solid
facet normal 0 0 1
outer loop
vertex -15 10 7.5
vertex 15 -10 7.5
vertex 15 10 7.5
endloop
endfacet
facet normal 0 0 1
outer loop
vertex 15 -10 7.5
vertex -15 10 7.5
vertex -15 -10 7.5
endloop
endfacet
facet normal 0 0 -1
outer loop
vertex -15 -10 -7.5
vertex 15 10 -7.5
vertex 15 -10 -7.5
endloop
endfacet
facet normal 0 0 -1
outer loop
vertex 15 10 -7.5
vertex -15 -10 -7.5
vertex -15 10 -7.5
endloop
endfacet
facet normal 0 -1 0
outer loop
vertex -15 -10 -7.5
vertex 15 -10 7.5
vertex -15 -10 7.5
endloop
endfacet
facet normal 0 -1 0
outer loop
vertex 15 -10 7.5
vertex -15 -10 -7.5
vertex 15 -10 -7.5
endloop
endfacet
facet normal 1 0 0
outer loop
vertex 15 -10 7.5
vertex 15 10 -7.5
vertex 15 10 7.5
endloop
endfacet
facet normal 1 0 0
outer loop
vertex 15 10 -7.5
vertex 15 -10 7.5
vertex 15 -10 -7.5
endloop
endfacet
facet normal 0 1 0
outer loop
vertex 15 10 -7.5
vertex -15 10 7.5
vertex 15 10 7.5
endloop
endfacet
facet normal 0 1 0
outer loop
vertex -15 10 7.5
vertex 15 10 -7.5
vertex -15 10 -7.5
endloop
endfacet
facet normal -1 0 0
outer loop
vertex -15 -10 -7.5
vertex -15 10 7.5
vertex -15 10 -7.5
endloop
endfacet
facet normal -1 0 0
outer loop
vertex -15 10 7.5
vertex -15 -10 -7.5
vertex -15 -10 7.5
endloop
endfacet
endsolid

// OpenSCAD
// Parameters
width = 30;
depth = 20;
height = 15;
$fn = 50;

// Model
cube([width, depth, height], center=true);
